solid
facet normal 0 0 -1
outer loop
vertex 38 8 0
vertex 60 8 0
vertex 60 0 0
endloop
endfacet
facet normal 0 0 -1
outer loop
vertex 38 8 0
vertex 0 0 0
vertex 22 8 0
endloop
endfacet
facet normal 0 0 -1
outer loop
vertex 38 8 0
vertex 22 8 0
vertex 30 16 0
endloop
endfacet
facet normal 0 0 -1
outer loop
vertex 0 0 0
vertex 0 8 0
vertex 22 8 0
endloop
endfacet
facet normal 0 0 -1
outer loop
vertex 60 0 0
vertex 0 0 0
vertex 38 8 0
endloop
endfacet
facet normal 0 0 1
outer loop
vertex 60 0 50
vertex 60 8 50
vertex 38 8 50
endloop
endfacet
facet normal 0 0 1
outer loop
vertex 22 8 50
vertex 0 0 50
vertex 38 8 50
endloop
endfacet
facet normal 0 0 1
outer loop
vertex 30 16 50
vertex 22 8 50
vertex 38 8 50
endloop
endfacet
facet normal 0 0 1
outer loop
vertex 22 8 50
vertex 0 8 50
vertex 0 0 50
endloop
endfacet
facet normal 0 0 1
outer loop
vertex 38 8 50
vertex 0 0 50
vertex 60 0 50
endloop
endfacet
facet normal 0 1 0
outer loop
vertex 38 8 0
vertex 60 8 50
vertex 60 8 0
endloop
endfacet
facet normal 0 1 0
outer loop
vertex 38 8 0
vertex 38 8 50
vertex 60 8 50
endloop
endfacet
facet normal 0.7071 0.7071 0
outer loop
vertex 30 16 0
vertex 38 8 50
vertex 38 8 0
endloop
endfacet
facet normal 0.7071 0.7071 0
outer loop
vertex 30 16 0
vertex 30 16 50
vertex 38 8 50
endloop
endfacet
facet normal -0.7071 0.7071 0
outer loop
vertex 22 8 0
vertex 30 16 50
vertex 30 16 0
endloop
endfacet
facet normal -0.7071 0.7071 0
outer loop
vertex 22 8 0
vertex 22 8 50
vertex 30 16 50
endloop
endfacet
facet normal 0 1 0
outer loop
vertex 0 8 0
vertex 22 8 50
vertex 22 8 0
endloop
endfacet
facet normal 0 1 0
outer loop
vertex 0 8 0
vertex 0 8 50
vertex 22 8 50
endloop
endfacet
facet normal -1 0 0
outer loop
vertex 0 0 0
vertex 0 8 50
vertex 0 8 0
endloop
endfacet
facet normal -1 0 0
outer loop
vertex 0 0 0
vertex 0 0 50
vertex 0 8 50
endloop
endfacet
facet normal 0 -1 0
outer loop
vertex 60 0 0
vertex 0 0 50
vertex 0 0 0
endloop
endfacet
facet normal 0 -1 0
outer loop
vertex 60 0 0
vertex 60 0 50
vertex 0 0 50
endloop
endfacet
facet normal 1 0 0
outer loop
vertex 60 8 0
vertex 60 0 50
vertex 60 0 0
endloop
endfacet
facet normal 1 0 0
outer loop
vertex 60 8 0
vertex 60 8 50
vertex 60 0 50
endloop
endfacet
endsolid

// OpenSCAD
$fn = 32;

// ----------------------------------------------------------------------
// V guide rail: vrib, 60 mm wide
// ----------------------------------------------------------------------

// --- parameters (mm) ---
rail_w = 60;              // rail width, X
base_t = 8;               // base plate thickness
v_depth = 8;              // V feature depth / height
v_half_w = 8;             // half width of the V at the base face
plate_t = 50;             // rail length, Z (the extrusion height)

profile = [[0, 0], [60, 0], [60, 8], [38, 8], [30, 16], [22, 8], [0, 8]];  // primary outline, 7 points, counter clockwise

// --- the one profile operation ---
linear_extrude(height = plate_t) polygon(points = profile);
